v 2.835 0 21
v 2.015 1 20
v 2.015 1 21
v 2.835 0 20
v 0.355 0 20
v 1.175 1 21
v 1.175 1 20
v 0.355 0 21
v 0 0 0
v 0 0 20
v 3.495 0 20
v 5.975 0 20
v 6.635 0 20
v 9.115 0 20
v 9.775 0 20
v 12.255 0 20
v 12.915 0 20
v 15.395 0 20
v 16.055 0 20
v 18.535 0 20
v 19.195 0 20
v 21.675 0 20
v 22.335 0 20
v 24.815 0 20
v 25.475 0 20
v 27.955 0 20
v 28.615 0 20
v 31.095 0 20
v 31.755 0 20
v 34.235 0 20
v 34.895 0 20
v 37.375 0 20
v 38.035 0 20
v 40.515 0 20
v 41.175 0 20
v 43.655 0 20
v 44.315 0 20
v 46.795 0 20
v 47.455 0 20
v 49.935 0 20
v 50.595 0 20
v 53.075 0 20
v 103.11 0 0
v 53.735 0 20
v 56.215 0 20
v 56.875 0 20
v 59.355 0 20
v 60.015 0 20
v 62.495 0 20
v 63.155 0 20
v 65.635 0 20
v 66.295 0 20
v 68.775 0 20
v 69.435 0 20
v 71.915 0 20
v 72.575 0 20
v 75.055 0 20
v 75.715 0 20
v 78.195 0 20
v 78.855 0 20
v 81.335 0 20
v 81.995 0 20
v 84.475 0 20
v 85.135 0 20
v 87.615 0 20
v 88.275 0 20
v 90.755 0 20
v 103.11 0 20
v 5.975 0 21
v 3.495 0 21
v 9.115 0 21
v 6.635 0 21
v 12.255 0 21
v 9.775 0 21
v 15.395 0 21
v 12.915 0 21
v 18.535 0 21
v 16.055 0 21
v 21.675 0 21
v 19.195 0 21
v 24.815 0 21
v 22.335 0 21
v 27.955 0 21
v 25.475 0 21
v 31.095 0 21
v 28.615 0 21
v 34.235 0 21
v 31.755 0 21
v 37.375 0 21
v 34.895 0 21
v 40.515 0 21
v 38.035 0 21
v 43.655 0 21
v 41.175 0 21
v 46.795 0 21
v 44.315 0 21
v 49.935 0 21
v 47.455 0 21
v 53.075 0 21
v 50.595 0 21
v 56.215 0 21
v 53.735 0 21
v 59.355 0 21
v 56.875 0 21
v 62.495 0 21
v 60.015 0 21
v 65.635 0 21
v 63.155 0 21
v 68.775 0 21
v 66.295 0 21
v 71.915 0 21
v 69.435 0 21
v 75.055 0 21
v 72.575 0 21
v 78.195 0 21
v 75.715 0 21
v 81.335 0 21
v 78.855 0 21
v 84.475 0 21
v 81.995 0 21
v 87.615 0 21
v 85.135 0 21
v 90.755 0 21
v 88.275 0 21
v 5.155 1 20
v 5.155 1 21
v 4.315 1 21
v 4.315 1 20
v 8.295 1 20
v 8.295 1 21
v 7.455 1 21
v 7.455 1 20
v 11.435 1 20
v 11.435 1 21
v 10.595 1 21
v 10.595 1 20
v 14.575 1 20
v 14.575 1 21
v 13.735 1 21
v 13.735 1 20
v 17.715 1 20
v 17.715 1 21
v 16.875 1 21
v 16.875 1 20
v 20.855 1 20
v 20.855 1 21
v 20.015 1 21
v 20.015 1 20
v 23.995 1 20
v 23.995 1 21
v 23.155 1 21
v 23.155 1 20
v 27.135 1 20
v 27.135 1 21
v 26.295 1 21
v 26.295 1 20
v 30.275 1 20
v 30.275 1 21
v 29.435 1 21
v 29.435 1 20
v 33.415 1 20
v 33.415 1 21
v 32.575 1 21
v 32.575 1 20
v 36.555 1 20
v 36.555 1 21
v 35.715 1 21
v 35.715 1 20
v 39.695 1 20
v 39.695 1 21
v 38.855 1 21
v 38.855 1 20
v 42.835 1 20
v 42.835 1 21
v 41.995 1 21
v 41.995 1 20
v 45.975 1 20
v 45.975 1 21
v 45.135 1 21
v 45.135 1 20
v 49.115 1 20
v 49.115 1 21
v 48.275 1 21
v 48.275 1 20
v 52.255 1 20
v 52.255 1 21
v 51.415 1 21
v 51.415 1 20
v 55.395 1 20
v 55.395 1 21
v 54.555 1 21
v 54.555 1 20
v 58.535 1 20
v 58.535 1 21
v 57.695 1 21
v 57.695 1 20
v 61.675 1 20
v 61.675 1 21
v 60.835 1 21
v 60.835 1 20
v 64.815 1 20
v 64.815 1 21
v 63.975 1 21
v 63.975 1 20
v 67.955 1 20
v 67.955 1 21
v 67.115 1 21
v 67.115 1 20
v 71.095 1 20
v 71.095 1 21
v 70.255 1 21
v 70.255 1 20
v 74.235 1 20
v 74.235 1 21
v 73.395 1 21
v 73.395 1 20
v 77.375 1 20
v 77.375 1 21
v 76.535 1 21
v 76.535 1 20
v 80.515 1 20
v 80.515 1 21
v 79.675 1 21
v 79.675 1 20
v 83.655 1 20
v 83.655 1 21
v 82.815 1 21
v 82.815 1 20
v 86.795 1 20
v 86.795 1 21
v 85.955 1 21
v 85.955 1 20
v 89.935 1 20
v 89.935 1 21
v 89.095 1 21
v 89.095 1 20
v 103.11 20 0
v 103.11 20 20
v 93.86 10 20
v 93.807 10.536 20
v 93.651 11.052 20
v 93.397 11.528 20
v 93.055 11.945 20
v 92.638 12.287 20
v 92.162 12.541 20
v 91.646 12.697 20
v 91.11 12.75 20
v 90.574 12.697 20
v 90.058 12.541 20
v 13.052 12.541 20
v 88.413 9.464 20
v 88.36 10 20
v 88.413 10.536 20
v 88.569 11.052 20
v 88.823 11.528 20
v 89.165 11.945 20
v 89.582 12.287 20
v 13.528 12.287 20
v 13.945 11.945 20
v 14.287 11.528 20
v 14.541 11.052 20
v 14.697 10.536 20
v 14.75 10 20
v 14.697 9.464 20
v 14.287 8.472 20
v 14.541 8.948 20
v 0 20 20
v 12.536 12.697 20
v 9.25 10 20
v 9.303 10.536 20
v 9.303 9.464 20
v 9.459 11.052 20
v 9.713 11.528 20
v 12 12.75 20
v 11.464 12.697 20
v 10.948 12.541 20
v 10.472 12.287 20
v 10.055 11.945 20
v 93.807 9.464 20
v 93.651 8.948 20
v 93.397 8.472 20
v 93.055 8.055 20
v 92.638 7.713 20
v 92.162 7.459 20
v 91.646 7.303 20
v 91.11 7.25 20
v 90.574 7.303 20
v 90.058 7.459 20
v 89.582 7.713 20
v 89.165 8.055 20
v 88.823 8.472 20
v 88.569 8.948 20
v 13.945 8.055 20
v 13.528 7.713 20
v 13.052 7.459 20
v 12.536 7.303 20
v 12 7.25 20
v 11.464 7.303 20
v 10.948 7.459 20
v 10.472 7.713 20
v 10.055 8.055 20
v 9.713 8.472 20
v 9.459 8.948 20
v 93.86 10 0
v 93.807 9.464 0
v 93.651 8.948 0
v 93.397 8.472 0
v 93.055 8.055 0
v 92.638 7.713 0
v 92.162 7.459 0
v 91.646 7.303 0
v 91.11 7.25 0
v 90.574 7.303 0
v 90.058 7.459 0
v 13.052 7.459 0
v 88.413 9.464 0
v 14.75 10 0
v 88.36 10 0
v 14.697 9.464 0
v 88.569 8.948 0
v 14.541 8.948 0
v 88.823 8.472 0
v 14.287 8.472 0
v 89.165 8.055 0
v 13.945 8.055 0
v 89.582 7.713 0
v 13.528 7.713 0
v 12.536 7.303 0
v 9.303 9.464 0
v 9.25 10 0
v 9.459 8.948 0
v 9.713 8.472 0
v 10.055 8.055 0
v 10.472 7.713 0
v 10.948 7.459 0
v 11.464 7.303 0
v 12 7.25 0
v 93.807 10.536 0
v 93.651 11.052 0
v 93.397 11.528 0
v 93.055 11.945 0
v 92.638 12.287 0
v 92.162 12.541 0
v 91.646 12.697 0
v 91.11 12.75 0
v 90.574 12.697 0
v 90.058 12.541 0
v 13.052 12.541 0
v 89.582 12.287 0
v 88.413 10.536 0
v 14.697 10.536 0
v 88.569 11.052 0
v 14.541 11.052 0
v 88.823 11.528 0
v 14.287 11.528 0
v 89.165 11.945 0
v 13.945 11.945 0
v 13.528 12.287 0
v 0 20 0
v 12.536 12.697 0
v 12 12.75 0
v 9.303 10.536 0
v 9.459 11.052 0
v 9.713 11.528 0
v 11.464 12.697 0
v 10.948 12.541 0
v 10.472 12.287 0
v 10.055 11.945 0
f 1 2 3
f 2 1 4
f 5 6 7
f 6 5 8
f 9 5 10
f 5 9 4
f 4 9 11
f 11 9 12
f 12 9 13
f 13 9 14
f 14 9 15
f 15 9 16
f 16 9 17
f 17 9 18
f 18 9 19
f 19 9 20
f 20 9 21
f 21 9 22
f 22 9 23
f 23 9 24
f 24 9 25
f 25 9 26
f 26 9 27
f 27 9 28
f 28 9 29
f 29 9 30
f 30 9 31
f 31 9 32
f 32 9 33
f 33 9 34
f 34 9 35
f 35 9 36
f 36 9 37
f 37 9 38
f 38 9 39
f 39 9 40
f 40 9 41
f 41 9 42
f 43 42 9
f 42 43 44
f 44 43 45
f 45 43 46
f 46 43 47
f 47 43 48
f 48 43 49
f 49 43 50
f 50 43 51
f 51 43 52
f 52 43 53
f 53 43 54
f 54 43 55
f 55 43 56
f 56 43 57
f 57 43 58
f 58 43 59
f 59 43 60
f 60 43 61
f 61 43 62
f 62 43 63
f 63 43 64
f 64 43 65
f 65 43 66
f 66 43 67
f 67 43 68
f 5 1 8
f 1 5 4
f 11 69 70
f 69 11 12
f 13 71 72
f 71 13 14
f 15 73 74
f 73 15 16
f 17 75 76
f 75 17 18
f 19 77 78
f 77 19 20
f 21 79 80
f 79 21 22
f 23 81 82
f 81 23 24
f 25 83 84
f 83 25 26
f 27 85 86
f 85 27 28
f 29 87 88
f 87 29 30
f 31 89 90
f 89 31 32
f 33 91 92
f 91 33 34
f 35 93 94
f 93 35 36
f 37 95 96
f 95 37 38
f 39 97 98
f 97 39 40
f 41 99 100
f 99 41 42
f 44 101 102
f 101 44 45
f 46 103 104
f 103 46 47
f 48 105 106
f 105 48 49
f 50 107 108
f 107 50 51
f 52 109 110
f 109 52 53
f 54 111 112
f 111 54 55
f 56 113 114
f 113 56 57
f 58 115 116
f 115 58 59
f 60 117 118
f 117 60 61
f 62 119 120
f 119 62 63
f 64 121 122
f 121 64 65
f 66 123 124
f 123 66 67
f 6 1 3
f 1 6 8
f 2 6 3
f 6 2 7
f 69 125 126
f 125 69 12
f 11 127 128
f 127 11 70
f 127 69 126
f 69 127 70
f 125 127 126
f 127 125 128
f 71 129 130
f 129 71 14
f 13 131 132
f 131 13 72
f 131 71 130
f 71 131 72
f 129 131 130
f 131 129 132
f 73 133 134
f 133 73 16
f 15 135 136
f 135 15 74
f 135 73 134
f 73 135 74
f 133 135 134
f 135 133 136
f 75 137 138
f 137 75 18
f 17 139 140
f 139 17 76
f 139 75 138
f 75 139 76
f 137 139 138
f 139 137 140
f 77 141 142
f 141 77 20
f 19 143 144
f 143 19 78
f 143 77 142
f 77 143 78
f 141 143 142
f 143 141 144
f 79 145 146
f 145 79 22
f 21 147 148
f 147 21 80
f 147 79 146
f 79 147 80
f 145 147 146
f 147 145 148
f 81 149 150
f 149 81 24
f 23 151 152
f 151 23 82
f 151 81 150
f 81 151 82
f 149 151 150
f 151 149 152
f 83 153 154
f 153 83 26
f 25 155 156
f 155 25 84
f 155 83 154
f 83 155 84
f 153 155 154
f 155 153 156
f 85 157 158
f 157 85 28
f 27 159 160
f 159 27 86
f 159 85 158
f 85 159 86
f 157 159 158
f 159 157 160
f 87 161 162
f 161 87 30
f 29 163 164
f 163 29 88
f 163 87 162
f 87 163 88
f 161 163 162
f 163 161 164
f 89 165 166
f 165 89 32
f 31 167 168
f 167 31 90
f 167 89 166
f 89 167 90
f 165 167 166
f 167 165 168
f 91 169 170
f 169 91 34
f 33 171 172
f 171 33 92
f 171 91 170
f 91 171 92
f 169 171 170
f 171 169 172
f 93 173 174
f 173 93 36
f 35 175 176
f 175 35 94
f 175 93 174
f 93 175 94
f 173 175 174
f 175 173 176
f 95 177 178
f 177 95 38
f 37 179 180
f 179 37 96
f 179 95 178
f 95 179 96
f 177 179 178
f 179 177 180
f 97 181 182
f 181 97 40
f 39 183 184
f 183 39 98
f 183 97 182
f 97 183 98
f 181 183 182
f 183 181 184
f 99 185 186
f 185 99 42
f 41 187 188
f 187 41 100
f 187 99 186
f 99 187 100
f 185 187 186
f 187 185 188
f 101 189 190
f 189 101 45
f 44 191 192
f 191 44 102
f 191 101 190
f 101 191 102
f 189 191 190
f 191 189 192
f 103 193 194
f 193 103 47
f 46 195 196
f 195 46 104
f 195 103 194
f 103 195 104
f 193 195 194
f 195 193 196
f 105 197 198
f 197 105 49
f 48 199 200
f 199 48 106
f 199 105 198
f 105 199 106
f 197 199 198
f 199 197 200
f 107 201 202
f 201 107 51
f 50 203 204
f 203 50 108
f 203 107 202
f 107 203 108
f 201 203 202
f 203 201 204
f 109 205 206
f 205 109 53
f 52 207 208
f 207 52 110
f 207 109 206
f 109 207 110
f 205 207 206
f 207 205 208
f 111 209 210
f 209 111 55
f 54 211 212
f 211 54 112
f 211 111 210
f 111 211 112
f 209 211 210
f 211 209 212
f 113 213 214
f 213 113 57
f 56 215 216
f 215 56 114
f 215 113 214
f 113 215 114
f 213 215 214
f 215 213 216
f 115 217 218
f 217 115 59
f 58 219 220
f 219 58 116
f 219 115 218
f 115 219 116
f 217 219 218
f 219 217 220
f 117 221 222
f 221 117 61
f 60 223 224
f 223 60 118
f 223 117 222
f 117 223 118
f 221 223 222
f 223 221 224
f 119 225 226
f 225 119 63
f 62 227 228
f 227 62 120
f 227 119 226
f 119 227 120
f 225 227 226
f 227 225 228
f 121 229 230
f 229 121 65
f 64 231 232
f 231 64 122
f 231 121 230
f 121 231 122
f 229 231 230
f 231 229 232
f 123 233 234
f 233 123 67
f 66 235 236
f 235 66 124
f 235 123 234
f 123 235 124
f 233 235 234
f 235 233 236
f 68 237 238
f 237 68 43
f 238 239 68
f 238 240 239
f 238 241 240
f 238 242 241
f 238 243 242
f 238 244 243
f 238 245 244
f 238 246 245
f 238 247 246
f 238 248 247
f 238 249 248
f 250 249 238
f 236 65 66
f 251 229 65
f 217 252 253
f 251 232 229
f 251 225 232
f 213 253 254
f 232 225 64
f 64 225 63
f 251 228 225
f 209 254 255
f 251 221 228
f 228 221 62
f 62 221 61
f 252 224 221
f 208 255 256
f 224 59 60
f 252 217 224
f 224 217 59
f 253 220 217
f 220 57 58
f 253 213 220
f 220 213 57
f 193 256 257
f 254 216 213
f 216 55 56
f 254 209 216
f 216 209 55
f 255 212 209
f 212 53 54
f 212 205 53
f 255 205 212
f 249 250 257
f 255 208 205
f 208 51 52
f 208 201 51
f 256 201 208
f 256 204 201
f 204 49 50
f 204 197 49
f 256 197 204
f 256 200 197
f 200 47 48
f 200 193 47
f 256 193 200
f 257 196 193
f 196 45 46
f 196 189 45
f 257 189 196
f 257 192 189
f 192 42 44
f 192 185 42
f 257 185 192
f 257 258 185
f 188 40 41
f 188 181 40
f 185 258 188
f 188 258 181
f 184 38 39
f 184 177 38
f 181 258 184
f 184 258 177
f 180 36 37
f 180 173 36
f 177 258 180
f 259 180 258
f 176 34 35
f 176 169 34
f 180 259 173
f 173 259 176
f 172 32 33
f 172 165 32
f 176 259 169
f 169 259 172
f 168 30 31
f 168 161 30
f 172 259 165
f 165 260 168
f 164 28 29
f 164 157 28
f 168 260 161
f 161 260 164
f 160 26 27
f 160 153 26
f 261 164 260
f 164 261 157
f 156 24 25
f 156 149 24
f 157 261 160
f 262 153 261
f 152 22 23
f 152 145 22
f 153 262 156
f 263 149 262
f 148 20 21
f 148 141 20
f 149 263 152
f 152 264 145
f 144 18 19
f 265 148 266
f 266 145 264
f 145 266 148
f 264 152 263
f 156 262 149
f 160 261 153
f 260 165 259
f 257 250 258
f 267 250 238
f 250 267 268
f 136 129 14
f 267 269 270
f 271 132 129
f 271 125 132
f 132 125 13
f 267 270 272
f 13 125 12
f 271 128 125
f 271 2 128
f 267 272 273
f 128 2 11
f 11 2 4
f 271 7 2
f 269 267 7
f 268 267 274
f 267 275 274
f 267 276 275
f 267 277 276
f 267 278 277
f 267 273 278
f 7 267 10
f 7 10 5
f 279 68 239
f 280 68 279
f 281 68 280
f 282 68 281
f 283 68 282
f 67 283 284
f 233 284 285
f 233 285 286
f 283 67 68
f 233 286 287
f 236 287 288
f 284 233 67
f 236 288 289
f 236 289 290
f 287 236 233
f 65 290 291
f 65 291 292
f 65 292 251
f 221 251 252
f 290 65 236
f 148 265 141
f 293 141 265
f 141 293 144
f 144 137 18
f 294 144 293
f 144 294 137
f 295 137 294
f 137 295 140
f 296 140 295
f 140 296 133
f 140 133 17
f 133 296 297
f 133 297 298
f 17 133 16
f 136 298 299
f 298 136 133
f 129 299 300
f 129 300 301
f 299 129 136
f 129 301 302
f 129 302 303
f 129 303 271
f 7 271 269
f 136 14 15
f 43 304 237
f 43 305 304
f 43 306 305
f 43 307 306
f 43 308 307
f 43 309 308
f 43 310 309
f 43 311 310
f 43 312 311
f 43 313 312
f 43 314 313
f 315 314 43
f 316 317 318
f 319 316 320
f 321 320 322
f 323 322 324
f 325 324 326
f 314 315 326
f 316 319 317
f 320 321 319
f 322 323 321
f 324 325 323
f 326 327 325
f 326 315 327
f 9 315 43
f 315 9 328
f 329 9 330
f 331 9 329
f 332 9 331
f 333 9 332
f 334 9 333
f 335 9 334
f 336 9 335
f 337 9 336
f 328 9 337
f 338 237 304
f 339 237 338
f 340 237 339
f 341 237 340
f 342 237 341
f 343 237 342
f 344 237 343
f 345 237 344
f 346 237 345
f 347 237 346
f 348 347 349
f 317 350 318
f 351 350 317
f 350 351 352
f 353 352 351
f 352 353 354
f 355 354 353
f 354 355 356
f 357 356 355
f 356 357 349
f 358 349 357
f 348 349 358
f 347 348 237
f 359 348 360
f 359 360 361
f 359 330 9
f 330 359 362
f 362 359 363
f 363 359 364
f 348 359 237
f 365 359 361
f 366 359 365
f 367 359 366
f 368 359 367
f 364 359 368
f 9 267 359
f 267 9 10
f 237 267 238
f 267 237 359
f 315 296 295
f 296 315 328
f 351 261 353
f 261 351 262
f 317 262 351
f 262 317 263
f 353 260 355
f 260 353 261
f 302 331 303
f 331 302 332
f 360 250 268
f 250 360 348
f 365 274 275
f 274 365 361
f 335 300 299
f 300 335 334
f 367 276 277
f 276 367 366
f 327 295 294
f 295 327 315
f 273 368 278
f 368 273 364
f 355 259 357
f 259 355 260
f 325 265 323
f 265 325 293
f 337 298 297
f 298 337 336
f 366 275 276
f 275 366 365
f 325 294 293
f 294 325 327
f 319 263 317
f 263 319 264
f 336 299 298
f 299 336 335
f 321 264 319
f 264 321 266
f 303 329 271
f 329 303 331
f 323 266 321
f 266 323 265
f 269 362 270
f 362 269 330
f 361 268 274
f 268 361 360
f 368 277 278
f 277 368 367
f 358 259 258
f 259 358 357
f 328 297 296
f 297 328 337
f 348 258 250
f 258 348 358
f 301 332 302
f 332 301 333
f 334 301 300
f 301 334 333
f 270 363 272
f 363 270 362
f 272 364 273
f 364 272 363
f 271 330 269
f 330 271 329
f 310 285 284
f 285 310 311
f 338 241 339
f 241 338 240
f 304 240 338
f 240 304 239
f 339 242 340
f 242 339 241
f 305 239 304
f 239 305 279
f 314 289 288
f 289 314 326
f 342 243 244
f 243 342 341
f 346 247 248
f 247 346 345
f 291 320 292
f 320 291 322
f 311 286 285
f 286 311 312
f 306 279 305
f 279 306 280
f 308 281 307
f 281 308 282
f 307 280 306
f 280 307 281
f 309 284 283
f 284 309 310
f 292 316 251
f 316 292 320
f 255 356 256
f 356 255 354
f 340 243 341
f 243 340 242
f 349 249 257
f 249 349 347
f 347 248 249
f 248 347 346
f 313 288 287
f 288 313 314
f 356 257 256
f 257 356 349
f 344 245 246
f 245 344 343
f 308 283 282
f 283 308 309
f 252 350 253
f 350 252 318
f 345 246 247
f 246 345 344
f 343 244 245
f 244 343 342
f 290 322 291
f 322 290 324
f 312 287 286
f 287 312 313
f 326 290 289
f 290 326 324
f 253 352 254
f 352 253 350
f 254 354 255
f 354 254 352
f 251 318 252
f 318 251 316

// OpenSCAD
$fn = 32;

// ----------------------------------------------------------------------
// Gear rack: m=1 z=29, 103.11 x 20 x 21 mm
// ----------------------------------------------------------------------

// --- parameters (mm) ---
length = 103.11;          // rack length, X
width = 20;               // rack width, Y
height = 21;              // overall height, Z
module_m = 1;             // module
back_t = 20;              // tooth root line height
pitch = 3.14;             // circular pitch
tip_w = 0.84;             // tooth thickness at the tip
root_w = 2.48;            // tooth thickness at the root line
hole_d = 5.5;             // mounting hole
sink = 0.6;               // tooth root overlap into the body

tooth_span = 91.11;

module tooth(x0) {
  /* 20 deg flank profile, sunk into the body for a positive overlap */
  translate([x0, 0, back_t - sink])
    linear_extrude(height = height - back_t + sink)
      polygon(points = [[-root_w / 2, 0], [root_w / 2, 0],
                        [tip_w / 2, height - back_t],
                        [-tip_w / 2, height - back_t]]);
}

difference() {
  union() {
    cube([length, width, back_t]);
    for (i = [0 : 29 - 1])
      tooth((i + 0.5) * pitch + (tooth_span - 29 * pitch) / 2);
  }
  translate([12, 10, -1]) cylinder(h = back_t + 2, d = hole_d);
  translate([91.11, 10, -1]) cylinder(h = back_t + 2, d = hole_d);
}
